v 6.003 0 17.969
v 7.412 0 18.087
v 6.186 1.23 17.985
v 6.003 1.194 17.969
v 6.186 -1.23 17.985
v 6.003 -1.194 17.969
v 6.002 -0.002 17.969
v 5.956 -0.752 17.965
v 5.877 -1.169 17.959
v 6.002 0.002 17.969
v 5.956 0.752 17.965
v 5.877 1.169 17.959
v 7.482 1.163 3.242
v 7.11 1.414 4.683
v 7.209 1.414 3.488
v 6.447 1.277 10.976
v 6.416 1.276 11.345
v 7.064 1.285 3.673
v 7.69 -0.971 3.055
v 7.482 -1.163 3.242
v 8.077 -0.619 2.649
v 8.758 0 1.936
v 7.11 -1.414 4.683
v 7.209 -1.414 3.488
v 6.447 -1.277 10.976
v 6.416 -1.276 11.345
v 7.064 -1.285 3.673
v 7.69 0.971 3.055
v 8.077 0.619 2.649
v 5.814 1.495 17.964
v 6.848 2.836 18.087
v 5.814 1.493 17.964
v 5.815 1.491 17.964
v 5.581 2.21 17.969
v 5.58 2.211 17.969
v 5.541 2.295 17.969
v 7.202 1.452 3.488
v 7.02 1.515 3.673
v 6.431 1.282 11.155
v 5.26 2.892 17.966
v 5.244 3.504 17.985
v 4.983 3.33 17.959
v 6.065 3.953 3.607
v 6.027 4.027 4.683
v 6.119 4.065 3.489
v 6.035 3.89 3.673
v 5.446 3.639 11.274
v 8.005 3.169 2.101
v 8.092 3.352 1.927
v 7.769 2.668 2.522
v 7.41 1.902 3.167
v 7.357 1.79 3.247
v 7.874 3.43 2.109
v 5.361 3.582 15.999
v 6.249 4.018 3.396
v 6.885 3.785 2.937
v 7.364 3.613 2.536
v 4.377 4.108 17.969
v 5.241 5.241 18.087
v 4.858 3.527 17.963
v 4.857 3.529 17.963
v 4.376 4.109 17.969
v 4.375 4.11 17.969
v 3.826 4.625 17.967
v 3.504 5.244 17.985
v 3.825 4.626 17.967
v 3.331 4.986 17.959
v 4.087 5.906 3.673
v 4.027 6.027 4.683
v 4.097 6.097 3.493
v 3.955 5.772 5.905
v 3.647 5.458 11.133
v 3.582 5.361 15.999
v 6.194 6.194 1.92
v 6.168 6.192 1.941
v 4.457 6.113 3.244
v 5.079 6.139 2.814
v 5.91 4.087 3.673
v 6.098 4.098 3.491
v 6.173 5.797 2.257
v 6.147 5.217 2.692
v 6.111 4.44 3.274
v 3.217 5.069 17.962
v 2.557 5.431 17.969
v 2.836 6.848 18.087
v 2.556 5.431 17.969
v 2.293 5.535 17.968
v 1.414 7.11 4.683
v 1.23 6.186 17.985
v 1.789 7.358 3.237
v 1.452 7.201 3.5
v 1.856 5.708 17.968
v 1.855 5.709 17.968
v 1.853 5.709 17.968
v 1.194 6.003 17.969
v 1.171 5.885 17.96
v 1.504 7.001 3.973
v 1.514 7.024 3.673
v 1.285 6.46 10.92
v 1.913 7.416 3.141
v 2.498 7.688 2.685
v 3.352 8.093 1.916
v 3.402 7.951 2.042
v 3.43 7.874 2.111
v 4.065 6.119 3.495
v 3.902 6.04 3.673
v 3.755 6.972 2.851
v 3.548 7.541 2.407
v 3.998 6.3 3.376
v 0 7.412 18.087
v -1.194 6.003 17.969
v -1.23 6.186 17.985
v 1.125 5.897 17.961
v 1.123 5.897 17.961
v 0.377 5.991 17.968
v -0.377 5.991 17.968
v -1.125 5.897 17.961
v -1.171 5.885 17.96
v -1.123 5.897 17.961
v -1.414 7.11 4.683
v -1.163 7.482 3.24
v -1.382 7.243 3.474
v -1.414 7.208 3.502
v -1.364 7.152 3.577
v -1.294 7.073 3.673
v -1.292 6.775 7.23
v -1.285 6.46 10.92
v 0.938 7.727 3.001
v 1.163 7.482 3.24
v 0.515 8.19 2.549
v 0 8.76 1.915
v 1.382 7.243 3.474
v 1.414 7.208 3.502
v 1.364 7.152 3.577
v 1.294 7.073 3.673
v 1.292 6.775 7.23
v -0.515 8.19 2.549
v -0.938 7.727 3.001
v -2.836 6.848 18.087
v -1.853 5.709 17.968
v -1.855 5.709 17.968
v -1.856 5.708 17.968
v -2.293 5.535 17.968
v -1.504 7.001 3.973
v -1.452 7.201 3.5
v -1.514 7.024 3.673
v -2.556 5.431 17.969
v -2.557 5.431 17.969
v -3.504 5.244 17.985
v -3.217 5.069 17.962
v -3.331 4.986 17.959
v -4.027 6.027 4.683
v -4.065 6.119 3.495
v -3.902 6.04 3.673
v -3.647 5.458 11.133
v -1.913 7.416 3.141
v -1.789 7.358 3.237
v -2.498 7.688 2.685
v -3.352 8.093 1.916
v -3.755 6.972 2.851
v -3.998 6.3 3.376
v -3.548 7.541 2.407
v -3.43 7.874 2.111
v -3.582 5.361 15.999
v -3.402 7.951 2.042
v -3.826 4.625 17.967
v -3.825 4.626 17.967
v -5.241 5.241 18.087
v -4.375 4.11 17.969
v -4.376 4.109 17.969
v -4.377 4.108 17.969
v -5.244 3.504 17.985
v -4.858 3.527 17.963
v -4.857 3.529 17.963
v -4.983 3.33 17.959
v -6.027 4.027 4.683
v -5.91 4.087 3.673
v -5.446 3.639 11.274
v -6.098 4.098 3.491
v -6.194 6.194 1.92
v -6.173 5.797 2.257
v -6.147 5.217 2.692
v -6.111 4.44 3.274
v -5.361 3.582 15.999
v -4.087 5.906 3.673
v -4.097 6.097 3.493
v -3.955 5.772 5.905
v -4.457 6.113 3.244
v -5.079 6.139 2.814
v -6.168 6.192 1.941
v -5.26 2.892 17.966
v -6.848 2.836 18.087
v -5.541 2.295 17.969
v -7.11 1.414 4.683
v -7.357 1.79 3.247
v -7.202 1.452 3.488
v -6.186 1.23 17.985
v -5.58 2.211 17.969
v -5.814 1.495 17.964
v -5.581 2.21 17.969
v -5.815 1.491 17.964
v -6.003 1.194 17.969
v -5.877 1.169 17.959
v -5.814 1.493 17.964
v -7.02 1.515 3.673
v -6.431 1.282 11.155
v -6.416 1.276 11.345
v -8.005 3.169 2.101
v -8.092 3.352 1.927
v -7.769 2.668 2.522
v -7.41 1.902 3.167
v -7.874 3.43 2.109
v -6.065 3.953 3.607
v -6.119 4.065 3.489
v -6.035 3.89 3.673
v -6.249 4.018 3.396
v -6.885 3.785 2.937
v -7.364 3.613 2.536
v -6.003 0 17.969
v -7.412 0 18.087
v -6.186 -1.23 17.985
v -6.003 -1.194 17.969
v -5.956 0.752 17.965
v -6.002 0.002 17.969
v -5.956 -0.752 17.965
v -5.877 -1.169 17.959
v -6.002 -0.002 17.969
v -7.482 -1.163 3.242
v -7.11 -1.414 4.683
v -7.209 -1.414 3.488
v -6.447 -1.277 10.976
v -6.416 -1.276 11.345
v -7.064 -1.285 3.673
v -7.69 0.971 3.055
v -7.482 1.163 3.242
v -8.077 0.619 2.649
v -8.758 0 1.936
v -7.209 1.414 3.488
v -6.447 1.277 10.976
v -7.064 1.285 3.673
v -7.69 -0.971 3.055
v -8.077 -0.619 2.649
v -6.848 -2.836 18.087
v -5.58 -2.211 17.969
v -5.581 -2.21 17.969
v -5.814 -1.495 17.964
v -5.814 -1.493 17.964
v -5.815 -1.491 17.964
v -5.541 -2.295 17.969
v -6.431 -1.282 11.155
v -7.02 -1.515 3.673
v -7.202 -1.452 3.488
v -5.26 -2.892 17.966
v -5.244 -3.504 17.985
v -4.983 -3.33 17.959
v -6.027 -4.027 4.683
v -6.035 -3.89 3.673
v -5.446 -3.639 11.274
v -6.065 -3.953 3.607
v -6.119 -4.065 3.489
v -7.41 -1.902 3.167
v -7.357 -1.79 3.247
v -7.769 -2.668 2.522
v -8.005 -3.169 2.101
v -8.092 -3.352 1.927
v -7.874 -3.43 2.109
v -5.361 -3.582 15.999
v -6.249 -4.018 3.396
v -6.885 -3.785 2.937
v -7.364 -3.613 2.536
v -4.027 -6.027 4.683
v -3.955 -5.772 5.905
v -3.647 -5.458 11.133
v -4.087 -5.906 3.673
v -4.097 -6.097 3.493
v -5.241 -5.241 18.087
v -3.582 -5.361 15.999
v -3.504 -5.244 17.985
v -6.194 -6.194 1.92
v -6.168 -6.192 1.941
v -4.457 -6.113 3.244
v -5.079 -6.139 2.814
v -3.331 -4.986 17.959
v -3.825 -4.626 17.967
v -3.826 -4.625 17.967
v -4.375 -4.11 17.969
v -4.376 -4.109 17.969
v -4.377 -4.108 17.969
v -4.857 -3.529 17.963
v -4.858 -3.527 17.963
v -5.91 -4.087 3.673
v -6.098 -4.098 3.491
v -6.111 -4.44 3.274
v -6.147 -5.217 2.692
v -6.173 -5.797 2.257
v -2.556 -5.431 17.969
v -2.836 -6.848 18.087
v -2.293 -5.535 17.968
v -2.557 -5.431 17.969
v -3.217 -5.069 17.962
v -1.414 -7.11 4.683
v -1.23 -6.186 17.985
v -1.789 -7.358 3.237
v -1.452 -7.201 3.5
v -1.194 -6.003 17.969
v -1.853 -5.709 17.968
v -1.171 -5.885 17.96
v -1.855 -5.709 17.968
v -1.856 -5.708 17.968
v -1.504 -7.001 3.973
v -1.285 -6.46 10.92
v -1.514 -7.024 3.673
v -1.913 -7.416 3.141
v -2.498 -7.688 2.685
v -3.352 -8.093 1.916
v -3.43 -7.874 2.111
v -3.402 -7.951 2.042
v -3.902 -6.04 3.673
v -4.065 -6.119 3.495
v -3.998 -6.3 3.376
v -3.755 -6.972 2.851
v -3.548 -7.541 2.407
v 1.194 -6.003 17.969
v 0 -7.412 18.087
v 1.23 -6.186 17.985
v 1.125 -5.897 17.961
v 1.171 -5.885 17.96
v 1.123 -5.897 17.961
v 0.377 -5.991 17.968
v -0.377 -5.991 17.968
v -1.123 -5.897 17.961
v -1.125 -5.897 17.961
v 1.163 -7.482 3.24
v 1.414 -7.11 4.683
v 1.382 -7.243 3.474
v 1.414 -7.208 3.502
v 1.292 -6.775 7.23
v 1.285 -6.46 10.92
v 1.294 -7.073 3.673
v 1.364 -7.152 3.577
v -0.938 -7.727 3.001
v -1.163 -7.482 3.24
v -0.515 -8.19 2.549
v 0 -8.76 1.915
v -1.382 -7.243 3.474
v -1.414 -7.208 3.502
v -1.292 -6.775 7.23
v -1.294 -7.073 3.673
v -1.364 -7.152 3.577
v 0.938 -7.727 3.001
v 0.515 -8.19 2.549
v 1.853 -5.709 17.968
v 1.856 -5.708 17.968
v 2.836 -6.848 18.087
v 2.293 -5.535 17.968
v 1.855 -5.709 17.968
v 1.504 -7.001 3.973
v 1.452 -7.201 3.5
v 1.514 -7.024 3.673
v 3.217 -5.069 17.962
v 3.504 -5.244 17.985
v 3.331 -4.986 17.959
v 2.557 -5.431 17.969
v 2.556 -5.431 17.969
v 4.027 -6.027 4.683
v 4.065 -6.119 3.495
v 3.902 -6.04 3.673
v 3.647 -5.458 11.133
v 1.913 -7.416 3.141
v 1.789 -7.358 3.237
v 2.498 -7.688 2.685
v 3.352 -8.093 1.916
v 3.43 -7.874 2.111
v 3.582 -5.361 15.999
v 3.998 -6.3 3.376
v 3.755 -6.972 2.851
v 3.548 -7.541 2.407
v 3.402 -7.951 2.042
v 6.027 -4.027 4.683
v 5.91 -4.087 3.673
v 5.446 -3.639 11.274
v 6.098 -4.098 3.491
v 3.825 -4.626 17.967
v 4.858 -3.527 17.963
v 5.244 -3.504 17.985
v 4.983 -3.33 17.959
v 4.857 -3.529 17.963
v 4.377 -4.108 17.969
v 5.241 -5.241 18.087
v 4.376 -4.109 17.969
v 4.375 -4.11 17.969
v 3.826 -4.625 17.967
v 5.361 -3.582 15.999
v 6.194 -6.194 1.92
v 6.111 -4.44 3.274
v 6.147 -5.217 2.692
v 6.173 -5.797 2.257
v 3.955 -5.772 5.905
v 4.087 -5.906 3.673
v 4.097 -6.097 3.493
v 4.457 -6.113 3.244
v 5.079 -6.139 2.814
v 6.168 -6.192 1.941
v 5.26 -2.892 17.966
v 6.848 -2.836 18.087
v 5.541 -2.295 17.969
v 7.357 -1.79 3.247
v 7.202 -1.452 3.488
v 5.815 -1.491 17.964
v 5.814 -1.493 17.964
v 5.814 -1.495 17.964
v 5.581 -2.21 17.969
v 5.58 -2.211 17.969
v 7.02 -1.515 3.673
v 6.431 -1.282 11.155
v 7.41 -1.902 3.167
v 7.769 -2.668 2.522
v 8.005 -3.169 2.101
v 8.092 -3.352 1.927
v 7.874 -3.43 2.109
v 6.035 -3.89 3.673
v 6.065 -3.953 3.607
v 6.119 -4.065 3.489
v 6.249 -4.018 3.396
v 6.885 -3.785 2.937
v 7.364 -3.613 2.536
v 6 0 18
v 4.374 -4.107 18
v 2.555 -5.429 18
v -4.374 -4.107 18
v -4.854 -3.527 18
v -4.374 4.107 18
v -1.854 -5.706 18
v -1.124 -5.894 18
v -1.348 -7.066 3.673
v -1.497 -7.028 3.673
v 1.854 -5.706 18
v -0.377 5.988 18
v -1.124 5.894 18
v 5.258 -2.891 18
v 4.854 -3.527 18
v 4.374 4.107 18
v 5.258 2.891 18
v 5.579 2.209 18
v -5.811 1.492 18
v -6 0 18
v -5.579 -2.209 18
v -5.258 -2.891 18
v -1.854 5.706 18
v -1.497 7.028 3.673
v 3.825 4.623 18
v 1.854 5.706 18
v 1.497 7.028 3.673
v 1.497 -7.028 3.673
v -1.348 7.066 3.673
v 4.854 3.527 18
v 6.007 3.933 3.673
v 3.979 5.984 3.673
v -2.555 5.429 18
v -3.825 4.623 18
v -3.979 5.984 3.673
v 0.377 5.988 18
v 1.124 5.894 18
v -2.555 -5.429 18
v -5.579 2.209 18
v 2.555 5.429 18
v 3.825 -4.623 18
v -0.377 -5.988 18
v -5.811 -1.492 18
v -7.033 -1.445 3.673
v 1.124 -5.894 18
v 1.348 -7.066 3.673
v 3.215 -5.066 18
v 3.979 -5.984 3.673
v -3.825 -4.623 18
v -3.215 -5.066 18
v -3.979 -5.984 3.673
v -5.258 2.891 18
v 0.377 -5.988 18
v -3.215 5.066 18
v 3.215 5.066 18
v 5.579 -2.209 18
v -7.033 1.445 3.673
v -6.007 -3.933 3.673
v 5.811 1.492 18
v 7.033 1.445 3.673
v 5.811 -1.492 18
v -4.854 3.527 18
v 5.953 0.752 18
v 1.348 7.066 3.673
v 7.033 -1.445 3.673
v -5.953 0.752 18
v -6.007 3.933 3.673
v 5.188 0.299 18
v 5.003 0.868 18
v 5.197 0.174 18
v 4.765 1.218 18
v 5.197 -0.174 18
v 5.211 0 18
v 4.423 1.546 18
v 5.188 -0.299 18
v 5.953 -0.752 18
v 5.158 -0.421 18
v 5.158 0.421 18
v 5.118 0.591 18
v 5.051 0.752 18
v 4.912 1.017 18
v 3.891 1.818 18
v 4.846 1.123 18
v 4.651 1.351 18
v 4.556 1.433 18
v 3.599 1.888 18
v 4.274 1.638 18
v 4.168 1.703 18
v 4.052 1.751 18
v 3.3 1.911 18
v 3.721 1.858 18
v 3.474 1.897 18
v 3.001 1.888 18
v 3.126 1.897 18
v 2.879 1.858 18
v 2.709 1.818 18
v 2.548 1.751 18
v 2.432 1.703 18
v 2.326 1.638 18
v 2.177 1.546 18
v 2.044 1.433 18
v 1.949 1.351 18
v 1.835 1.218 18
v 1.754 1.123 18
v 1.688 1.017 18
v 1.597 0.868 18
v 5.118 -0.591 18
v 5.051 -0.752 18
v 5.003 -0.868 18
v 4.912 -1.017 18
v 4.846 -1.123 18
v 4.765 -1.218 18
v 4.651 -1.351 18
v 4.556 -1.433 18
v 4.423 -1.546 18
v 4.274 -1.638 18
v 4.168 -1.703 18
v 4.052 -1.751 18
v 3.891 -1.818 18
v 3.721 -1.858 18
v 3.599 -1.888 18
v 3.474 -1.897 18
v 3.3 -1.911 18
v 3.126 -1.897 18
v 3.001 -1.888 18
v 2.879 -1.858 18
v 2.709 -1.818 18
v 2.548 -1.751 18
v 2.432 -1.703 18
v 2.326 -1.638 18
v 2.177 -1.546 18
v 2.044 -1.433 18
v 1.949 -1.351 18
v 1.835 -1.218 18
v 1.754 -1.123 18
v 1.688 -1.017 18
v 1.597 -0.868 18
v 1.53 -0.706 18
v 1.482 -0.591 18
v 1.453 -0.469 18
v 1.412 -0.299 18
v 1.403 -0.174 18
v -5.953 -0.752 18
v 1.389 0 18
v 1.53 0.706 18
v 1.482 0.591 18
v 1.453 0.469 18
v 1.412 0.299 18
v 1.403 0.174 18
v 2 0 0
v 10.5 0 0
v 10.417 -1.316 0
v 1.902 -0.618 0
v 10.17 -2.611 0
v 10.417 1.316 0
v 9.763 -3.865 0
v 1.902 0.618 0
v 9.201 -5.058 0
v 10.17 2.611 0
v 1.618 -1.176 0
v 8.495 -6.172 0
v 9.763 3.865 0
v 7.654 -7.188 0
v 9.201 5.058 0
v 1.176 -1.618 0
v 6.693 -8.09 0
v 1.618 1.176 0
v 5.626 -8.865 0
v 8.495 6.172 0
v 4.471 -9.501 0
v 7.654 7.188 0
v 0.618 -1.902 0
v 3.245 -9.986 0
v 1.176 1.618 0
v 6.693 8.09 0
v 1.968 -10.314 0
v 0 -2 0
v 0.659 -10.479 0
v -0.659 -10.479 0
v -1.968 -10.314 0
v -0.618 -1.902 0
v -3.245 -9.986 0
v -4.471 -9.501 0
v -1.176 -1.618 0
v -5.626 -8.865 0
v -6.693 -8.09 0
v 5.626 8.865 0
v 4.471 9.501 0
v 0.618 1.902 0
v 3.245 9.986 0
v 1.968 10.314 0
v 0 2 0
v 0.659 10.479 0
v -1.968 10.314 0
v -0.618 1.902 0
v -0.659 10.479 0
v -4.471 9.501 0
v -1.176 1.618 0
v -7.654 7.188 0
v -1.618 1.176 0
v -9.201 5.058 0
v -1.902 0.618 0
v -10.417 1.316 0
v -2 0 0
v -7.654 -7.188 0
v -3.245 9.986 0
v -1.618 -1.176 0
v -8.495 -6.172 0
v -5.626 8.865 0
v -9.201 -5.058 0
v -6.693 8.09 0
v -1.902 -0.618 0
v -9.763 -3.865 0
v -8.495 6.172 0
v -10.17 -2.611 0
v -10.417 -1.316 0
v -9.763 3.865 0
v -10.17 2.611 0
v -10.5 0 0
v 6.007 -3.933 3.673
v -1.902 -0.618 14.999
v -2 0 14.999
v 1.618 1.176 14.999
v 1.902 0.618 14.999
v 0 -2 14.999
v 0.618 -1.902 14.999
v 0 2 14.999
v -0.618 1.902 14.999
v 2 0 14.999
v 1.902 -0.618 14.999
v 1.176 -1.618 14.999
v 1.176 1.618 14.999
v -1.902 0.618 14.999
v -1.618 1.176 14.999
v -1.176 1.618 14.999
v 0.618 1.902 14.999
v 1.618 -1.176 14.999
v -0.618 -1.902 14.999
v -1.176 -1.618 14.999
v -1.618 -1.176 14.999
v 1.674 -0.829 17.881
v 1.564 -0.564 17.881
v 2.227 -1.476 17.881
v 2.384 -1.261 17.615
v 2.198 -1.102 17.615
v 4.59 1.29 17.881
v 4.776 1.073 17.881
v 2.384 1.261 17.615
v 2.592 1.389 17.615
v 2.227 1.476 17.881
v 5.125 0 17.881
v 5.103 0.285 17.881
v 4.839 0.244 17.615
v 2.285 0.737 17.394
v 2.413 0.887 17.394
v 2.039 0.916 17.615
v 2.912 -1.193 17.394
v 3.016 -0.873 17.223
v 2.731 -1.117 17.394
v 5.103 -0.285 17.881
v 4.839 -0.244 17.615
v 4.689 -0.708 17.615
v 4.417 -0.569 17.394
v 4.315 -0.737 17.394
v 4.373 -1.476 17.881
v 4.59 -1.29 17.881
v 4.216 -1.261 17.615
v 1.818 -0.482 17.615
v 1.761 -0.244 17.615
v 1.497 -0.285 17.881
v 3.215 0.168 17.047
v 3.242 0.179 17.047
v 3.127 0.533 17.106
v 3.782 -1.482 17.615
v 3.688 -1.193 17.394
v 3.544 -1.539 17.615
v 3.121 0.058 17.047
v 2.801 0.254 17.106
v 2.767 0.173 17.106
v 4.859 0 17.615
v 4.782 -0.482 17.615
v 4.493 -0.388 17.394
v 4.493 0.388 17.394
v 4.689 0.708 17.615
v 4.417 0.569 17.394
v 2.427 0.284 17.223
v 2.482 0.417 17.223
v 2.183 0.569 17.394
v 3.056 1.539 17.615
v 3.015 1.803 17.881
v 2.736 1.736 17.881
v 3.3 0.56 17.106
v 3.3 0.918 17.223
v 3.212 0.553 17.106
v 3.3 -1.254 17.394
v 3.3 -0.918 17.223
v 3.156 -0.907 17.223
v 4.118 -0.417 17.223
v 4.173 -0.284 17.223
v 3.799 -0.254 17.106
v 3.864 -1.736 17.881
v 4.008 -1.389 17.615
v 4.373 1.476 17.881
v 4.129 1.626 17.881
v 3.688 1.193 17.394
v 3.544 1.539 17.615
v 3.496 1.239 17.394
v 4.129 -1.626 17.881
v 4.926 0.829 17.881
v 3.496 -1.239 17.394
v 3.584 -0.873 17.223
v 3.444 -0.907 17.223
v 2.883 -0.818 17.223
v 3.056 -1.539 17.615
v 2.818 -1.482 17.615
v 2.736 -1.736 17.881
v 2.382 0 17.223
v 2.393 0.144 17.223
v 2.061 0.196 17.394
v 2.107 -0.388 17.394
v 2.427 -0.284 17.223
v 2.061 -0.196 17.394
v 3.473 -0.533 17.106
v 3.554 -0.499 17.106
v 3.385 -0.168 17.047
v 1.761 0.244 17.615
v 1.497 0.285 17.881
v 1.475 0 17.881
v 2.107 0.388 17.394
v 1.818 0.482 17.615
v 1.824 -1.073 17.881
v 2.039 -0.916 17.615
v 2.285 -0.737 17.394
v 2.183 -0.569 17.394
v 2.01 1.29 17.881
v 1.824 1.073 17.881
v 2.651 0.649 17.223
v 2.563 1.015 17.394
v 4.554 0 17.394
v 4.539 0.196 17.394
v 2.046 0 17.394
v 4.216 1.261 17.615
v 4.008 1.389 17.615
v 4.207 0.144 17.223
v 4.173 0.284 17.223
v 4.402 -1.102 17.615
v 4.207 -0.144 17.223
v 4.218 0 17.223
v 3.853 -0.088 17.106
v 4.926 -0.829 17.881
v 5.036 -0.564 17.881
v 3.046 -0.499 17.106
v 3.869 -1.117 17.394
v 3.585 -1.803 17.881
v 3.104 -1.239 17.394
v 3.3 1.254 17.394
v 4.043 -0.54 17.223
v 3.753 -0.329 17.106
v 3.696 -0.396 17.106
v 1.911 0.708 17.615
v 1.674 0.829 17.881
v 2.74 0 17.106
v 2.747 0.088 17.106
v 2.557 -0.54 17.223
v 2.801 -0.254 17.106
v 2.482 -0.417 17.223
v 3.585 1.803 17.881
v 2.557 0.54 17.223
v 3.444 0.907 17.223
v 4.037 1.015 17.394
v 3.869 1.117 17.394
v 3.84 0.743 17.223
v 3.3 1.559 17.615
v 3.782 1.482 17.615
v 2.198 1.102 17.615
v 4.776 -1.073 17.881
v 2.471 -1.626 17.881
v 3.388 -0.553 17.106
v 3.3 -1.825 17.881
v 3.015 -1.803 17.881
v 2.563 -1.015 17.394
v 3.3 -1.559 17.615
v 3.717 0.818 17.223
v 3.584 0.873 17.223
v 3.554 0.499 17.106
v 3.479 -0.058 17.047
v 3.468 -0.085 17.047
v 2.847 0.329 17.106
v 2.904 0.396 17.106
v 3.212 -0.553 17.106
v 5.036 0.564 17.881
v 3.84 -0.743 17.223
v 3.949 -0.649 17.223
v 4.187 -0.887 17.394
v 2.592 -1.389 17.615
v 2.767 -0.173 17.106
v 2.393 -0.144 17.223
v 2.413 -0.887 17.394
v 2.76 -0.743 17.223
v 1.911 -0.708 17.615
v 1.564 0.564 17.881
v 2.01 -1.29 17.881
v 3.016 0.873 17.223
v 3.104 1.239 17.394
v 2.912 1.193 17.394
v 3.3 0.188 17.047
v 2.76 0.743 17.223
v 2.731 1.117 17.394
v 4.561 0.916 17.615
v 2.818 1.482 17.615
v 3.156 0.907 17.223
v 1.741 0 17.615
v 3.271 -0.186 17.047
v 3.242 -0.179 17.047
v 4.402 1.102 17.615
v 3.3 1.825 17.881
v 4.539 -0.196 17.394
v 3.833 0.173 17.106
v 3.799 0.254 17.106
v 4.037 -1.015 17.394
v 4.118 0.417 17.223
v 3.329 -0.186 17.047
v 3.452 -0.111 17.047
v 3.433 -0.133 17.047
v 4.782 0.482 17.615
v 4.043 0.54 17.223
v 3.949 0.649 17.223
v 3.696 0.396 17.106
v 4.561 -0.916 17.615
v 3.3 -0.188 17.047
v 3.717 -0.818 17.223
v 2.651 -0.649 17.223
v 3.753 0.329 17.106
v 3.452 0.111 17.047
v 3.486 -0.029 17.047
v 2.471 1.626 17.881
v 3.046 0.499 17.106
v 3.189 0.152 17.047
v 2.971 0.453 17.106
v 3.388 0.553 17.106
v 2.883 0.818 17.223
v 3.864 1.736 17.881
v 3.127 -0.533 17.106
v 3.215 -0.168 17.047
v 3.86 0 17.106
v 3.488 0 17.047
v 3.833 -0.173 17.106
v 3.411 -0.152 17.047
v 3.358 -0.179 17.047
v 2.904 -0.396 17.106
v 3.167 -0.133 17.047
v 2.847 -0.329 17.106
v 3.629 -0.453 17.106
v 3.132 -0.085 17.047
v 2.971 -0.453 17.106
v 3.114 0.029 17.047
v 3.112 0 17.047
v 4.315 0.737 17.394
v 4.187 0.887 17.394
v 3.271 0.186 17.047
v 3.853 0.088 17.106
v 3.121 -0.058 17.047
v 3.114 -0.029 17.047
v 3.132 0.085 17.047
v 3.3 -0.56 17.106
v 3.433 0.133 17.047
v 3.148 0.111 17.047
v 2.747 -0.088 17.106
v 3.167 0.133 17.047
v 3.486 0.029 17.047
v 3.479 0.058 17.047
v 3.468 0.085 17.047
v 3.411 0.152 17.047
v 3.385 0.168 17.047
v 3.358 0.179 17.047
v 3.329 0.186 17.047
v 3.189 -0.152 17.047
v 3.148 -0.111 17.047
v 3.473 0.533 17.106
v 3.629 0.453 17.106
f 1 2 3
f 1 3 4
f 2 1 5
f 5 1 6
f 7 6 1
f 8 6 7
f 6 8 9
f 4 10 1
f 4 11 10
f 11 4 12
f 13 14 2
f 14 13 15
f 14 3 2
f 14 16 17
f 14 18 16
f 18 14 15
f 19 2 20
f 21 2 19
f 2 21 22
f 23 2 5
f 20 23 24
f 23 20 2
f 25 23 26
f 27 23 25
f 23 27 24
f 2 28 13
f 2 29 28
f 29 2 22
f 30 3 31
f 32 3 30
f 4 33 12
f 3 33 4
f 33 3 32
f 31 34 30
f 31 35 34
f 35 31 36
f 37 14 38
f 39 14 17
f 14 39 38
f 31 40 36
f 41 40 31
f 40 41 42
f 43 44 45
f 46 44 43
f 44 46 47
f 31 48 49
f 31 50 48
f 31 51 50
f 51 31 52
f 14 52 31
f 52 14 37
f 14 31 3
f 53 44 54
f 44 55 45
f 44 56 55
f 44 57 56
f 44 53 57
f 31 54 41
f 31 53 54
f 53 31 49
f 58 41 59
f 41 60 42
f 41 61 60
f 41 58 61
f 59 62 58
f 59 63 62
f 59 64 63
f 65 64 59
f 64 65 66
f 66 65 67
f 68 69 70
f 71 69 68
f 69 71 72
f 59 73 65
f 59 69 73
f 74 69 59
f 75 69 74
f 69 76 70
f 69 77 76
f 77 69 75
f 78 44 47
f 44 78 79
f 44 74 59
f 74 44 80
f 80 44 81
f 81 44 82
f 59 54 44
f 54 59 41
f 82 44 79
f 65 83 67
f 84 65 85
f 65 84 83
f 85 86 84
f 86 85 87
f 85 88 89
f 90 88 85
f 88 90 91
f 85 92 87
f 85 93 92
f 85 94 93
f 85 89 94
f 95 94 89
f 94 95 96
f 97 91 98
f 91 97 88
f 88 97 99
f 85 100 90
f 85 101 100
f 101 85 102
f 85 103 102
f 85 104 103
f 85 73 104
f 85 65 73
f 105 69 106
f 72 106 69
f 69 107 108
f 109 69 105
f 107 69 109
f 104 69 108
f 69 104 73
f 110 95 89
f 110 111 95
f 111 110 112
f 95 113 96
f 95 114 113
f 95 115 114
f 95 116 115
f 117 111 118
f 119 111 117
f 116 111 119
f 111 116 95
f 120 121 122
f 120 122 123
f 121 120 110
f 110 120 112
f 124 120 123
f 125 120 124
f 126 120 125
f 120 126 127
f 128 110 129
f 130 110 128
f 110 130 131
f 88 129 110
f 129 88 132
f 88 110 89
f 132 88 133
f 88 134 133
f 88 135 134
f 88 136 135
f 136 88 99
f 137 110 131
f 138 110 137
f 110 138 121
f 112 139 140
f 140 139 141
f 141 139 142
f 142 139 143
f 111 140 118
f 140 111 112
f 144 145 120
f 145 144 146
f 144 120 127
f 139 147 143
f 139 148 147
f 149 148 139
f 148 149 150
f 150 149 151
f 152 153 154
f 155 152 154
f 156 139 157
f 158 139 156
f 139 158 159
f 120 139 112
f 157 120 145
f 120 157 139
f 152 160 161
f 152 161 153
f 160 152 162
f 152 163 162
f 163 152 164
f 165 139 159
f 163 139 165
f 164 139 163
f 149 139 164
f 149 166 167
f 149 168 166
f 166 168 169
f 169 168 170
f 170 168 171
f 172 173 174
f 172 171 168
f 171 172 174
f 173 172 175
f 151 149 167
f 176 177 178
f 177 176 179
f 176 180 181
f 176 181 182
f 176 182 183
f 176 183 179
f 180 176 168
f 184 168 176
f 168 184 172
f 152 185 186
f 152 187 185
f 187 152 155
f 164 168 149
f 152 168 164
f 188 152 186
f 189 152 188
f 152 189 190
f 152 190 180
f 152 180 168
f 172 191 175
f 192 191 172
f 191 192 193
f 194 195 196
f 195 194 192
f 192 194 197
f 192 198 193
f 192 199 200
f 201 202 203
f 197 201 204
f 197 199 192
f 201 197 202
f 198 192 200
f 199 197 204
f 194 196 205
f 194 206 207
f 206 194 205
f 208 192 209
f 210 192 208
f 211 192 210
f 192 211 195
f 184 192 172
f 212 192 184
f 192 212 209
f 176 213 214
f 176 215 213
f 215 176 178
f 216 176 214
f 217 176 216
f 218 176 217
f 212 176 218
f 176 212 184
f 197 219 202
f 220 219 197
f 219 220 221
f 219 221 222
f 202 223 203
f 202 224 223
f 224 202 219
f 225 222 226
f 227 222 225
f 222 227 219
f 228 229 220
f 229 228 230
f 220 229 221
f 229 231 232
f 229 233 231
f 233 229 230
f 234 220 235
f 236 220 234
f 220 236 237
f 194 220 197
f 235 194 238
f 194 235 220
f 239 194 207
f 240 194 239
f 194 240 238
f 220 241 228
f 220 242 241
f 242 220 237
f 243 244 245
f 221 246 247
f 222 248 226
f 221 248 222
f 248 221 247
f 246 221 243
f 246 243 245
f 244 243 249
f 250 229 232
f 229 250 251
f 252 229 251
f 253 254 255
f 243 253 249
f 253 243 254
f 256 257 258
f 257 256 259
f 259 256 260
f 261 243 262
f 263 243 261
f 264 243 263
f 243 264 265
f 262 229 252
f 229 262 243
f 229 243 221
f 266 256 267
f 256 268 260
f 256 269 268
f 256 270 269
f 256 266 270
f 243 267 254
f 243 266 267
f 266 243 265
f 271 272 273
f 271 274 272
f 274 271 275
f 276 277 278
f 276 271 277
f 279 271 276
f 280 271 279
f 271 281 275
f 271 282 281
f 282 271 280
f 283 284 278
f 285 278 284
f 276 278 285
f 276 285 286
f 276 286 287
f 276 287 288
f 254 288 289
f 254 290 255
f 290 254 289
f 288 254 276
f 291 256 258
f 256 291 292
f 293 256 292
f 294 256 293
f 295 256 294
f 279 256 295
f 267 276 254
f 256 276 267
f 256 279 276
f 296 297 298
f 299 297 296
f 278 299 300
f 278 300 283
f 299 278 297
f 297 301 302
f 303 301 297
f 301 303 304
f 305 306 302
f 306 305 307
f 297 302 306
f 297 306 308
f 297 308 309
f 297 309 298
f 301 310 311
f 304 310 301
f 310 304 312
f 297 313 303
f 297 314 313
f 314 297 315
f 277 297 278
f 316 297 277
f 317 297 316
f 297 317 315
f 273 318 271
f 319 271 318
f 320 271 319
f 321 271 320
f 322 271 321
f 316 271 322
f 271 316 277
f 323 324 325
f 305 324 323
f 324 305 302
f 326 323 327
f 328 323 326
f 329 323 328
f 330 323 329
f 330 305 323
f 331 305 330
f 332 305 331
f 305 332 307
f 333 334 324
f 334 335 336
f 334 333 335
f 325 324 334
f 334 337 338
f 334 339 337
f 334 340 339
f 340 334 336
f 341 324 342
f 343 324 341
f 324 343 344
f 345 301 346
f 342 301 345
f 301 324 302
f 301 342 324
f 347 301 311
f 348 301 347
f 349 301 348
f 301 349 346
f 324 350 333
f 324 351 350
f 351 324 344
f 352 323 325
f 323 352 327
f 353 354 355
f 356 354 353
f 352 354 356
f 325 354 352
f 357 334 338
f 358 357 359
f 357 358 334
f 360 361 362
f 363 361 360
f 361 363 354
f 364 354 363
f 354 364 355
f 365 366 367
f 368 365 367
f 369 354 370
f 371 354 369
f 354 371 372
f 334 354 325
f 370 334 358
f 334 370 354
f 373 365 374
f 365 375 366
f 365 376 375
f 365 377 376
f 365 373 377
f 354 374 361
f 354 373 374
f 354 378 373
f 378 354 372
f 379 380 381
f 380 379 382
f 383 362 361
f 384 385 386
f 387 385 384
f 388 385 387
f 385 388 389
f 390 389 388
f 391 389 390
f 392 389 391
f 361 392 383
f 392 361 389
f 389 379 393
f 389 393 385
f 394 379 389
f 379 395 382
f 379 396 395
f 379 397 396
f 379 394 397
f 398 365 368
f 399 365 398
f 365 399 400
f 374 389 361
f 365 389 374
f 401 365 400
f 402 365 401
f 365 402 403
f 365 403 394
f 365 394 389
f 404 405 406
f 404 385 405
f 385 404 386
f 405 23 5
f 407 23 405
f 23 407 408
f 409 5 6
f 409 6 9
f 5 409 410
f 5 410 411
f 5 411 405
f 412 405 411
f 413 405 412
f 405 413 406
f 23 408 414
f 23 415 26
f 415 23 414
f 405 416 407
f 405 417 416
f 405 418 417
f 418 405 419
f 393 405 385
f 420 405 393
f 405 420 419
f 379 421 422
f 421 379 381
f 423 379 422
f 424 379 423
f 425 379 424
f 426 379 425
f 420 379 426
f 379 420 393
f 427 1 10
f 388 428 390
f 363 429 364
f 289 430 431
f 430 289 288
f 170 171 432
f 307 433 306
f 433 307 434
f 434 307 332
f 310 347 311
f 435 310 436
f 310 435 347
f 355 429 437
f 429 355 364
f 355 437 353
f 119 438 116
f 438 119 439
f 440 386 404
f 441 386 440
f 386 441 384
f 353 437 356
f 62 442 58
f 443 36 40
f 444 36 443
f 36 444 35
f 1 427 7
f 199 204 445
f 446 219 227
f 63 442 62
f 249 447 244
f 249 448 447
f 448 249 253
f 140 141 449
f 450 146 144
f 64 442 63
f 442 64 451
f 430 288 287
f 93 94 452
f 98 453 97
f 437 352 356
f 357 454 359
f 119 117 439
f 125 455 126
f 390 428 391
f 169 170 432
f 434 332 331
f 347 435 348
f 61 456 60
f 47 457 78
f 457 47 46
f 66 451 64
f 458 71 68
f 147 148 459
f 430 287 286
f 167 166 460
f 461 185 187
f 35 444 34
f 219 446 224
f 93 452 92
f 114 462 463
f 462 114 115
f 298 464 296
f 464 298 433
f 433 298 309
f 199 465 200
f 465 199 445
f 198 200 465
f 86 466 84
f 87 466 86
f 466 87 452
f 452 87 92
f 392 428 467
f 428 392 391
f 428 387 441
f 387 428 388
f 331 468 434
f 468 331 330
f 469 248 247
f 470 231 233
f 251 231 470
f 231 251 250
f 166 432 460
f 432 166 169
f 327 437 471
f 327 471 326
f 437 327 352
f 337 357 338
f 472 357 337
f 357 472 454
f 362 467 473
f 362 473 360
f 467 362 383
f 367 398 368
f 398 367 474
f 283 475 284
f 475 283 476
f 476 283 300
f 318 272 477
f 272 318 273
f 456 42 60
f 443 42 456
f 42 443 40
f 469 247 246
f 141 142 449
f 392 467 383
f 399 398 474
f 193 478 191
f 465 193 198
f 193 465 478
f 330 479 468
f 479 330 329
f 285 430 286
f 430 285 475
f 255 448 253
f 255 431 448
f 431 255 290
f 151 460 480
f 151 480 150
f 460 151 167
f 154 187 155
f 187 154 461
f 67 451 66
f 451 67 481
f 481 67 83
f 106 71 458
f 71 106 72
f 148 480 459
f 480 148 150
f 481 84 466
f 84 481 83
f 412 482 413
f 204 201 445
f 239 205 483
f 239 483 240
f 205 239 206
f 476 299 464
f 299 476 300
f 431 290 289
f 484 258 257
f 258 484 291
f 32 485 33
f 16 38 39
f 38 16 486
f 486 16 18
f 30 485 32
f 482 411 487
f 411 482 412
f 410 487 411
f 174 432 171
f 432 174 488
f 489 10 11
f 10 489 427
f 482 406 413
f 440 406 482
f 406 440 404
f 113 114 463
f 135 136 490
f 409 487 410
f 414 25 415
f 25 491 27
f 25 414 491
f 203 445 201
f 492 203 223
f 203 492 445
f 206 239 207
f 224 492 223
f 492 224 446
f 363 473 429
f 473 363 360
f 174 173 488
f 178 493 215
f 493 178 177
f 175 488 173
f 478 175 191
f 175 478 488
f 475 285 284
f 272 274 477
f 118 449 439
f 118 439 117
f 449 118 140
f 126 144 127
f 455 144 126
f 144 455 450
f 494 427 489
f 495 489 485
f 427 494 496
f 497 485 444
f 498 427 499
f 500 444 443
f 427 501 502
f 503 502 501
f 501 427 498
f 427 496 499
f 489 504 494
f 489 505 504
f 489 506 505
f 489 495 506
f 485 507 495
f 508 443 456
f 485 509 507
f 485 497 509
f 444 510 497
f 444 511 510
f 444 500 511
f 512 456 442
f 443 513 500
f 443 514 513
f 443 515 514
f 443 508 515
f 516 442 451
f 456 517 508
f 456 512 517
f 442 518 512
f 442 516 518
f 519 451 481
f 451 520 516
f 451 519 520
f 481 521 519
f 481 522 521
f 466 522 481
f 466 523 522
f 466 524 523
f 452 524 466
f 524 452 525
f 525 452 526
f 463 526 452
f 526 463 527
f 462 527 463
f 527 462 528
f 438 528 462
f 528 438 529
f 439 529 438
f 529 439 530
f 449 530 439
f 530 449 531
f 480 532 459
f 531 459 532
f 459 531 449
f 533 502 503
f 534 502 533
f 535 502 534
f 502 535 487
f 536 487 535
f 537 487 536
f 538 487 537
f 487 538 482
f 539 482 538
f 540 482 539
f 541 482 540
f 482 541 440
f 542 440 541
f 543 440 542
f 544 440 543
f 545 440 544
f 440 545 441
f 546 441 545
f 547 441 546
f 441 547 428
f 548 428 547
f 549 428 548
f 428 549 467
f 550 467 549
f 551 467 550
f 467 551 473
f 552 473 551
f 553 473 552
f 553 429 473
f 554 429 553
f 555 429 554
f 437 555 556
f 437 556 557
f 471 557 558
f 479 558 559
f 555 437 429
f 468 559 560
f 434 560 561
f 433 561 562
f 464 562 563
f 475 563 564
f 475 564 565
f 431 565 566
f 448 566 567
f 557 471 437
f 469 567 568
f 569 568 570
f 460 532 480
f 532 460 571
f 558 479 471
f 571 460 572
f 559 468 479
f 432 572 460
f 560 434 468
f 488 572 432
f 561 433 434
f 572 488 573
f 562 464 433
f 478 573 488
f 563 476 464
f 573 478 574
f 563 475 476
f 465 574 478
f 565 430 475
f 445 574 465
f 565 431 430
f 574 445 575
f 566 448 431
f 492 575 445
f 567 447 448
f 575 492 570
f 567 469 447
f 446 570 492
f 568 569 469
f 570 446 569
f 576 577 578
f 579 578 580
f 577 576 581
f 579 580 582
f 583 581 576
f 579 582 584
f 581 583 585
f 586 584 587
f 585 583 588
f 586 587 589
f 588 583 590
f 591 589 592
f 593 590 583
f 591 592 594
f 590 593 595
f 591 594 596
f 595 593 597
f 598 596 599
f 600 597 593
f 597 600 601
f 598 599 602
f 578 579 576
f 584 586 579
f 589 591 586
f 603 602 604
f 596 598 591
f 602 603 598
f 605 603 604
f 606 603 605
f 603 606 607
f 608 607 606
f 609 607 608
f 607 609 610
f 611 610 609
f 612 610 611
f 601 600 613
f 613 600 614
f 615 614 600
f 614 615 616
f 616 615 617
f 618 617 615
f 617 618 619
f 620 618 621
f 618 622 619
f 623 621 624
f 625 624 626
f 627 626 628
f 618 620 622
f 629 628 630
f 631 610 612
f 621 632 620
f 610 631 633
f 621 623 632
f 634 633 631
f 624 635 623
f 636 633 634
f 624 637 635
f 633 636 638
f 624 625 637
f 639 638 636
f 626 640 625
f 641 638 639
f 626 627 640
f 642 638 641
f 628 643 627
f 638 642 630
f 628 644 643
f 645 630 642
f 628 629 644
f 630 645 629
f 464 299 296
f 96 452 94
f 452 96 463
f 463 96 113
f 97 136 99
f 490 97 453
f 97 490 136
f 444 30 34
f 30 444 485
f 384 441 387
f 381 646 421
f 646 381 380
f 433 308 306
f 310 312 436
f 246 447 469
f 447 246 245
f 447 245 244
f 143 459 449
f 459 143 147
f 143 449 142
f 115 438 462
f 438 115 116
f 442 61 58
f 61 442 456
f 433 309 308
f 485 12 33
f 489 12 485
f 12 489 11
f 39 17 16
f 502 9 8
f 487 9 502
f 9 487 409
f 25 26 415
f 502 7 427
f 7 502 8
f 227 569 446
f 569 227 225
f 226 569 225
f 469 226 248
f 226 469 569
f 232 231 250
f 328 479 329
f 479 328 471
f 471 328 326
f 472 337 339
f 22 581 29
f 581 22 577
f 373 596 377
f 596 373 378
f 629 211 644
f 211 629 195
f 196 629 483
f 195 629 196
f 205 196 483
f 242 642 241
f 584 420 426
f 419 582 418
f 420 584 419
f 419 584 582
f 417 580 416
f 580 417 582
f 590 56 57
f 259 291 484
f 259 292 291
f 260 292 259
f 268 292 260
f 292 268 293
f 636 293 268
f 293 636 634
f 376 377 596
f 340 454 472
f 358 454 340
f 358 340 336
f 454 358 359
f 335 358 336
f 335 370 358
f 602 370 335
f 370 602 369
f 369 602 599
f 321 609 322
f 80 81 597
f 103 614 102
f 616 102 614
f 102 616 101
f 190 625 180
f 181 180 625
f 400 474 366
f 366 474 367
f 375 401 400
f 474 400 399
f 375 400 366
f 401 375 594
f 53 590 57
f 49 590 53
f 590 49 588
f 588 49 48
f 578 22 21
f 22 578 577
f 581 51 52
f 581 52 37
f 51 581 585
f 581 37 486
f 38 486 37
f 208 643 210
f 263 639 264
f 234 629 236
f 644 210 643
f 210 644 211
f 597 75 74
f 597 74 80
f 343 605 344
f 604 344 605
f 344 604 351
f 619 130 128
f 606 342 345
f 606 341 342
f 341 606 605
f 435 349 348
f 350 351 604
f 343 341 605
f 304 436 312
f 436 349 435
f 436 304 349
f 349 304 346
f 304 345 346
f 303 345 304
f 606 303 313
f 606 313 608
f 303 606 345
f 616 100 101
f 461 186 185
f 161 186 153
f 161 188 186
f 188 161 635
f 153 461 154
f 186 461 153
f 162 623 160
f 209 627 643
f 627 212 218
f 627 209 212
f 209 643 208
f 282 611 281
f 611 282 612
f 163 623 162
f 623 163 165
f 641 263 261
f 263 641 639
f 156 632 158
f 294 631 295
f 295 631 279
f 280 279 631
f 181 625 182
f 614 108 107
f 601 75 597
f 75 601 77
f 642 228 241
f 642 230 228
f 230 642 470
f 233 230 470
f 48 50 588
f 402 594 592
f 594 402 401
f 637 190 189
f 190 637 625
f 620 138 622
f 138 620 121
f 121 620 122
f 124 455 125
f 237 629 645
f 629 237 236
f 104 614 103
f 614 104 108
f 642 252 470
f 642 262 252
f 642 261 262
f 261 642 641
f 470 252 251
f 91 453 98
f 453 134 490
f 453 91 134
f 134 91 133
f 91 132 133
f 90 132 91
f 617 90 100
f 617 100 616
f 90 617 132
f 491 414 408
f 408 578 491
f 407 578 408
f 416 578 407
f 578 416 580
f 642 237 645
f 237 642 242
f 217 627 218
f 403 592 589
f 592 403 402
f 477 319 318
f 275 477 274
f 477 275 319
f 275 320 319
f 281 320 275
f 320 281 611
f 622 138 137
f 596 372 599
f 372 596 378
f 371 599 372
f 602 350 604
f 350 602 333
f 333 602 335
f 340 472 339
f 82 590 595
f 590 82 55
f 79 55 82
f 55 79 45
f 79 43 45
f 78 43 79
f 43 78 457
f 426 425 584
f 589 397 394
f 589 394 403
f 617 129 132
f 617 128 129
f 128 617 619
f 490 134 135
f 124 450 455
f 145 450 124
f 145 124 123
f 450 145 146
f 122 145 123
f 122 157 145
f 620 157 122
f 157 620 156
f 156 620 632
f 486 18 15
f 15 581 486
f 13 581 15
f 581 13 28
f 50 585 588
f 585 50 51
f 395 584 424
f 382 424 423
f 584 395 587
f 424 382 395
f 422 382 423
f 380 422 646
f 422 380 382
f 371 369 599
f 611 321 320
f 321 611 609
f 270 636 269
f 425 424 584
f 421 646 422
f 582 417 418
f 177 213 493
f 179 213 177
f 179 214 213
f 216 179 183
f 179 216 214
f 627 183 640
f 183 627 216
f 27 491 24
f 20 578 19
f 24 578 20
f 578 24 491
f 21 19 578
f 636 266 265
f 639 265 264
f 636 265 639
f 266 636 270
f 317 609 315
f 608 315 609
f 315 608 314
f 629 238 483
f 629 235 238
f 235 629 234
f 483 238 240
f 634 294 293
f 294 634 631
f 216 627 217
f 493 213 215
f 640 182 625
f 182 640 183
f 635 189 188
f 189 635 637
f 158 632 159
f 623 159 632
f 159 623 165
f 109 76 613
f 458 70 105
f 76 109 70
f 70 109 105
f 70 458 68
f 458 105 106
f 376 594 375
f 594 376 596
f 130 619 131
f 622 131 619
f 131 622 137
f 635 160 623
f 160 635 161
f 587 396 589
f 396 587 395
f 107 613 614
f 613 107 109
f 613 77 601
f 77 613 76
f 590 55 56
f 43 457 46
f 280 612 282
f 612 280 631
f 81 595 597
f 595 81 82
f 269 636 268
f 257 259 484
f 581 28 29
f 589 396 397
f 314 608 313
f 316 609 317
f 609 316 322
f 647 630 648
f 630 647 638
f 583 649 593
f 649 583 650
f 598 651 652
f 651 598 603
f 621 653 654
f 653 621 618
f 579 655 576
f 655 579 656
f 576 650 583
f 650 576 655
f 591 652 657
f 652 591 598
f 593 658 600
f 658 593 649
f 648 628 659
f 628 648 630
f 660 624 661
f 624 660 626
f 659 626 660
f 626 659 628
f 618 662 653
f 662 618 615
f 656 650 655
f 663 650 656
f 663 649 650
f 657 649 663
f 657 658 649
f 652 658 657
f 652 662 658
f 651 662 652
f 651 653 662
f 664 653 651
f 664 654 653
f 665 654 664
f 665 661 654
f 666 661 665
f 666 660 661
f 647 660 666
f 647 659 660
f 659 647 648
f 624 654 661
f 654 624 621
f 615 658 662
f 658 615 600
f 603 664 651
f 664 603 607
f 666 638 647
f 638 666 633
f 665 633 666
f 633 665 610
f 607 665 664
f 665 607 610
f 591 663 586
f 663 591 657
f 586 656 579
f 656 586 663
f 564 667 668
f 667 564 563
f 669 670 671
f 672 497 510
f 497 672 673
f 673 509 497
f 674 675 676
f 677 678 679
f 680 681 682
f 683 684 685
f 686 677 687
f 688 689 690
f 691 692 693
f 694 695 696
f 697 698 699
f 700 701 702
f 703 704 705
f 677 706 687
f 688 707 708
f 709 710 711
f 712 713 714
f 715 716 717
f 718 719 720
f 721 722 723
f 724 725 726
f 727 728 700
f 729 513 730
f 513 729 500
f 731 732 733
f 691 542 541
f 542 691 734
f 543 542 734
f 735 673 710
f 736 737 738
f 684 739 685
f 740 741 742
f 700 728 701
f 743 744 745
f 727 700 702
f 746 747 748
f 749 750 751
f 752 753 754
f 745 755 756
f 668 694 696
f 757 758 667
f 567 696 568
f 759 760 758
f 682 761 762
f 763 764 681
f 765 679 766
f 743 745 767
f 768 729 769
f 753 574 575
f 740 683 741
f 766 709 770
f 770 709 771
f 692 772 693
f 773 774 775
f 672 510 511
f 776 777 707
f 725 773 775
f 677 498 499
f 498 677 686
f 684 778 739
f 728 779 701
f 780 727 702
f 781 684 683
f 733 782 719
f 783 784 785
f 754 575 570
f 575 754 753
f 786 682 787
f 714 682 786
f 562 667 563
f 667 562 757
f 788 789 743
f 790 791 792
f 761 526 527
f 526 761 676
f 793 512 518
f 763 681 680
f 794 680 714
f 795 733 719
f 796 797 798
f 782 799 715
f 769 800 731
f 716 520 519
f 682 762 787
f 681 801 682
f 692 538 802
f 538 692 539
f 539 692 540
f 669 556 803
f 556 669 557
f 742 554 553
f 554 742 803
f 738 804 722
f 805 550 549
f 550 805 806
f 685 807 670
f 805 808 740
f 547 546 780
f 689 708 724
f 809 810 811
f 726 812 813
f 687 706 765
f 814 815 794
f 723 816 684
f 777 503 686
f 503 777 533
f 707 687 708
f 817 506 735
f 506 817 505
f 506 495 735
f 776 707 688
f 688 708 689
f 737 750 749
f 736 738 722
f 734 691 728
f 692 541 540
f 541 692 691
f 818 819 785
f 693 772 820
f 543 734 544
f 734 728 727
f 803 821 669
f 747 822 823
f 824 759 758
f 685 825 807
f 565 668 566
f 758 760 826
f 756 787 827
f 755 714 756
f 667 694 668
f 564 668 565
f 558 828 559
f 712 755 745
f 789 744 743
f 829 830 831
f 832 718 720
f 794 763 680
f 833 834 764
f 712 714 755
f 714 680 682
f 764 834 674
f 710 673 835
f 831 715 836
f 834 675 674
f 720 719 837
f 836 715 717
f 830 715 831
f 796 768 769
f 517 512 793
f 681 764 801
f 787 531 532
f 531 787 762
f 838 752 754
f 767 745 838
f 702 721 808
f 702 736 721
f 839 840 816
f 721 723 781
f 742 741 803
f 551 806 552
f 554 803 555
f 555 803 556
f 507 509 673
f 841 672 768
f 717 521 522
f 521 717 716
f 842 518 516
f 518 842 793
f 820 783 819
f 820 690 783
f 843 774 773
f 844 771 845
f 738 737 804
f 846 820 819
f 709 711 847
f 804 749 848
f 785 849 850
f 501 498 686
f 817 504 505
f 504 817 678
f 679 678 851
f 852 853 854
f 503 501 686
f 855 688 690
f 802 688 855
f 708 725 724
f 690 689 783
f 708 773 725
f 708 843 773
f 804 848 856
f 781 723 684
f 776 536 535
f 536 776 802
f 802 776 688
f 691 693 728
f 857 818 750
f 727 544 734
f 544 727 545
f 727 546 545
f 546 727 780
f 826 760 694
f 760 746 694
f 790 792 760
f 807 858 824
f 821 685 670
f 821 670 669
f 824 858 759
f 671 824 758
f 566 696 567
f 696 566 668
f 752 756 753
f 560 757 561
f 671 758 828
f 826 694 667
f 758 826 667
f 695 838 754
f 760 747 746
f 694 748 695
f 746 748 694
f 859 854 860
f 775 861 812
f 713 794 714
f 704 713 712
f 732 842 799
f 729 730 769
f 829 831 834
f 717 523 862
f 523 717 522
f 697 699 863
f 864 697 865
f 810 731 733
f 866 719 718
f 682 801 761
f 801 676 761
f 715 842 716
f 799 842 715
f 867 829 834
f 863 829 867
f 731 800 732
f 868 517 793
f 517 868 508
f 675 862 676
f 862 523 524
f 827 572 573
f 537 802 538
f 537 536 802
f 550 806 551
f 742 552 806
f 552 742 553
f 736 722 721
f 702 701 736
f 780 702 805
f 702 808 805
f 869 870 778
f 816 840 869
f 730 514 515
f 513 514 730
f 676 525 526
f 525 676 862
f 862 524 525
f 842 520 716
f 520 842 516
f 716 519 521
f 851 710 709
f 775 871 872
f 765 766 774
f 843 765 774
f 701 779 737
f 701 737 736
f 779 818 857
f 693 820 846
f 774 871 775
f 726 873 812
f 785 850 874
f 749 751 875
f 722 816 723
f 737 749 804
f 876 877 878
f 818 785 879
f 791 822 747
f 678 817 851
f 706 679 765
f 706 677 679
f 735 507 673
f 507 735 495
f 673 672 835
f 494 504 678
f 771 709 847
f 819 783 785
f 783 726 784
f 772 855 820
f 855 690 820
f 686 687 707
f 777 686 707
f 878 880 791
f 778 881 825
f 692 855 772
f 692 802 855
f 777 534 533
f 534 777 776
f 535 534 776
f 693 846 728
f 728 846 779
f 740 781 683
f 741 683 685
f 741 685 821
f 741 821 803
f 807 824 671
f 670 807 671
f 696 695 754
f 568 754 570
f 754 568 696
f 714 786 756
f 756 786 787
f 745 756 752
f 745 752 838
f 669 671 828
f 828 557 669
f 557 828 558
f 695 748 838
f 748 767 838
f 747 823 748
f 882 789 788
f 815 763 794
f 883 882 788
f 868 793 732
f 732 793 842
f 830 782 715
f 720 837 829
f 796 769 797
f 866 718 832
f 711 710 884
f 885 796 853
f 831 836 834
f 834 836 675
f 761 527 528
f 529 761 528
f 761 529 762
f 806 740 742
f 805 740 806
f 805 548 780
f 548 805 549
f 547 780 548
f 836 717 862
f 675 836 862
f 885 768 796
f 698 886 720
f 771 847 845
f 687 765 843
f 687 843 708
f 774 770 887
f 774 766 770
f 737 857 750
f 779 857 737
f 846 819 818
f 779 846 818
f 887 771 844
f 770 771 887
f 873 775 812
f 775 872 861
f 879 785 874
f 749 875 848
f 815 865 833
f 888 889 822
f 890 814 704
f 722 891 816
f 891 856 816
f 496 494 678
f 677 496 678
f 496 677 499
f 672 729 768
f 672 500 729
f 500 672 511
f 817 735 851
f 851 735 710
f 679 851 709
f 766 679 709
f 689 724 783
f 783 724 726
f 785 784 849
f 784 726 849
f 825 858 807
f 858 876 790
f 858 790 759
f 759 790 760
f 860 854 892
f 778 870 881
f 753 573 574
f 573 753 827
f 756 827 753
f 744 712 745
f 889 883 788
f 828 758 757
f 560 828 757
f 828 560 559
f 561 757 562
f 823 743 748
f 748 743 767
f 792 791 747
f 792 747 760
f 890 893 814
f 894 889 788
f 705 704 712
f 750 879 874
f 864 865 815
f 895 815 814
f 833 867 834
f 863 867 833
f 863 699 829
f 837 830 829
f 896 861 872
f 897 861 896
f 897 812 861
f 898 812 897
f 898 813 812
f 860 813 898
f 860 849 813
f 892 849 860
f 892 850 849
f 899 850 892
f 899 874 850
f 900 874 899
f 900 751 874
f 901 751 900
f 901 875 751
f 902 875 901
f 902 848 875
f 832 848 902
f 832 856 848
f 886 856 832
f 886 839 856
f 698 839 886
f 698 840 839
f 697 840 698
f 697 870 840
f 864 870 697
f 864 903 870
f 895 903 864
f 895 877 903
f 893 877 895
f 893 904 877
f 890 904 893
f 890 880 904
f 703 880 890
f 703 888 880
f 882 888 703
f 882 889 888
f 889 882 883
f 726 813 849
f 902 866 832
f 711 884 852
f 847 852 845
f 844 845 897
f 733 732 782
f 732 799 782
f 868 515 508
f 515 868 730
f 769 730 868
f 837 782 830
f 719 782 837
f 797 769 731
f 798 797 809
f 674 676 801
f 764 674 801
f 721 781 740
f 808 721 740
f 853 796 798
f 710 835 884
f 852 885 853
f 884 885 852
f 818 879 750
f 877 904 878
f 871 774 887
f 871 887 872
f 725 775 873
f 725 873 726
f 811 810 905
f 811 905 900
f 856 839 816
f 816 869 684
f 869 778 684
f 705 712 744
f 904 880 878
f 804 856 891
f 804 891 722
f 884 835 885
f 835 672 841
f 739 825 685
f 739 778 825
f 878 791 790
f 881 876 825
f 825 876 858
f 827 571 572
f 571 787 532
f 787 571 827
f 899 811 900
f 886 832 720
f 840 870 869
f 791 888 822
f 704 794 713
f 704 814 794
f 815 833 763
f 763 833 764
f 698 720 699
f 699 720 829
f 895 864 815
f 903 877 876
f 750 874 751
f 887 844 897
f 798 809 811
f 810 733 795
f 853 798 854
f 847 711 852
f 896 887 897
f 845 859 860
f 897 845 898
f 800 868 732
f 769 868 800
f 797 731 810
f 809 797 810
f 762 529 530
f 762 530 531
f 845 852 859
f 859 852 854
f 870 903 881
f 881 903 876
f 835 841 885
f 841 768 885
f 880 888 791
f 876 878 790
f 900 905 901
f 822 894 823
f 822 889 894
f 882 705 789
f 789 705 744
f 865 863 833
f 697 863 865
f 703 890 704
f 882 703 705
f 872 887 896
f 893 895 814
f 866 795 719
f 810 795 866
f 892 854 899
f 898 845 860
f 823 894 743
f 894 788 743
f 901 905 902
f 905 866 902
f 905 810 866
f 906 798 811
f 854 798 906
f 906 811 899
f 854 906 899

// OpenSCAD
// Loch-Durchmesser in mm.
HoleDiameter = 4;

// Tiefe des Lochs im Boden (in mm). 
HoleDepth = 15;

// Wenn du ein D-förmiges Loch wünscht, stelle die Dicke auf der flachen Seite (in mm) ein.  Größere Werte für die Ebene machen das Loch kleiner.
HoleFlatThickness = 0;

// Höhe (in mm).  Wenn die Kuppelkappe ausgewählt ist, ist sie nicht in der Höhe enthalten.  Auch die Wellenlänge wird nicht gezählt.
KnobHeight = 18 ;

// Durchmesser des Knopfes in mm.  
KnobDiameter = 15;

// Form der Oberseite des Knopfes.  Der Typ "Einbau" kann lackiert werden.
CapType = 0;	// [0:Flach, 1:Einbau, 2:Dome]

// Möchtest du einen großen StilZeiger?
TimerKnob=0;	// [0:Nein, 1:Ja]

// Möchtest du eine Markierung oben, um die Richtung anzuzeigen?
Pointer1 = 1;	// [0:Nein, 1:Ja]

// Möchtest du einen Richtungszeiger?
Pointer2 = 0;	// [0:Nein, 1:Ja]

// Willst du einen Rändelung um den Knopf?
Knurled = 1;	// [0:Nein, 1:Ja]

// 0 = Ein zylindrischer Knopf, jeder andere Wert verjüngen den Knopf.
TaperPercentage = 20;		// [0:0%, 10:10%, 20:20%, 30:30%, 40:40%, 50:50%]

// Breite des Rings "Dial" (in mm).  0= keine RIng
RingWidth = 3;

// Die Anzahl der Markierungen auf dem Zifferblatt.  0 = keine Markierungen   (RingWidth muss ungleich Null sein.)
RingMarkings = 0;

// Durchmesser des Lochs für die Befestigungsschraube in mm.  0 = kein Loch
ScrewHoleDiameter = 0;

//  Länge der Welle auf der Unterseite des Knopfes (in mm).  0 = keine Welle
ShaftLength = 0;

// Durchmesser der Welle auf der Unterseite des Knopfes in mm.  (ShaftLength größer Null sein.)
ShaftDiameter = 10;

// Möchtest du eine Kerbe in der Welle?  Es kann für einen Einpressknopf verwendet werden (anstelle einer Befestigungsschraube).  (ShaftLength größer Null sein.)
NotchedShaft = 0;	// [0:No, 1:Yes]

$fn=60;

//////////////////////////
//Erweiterte Einstellungen
//////////////////////////

RingThickness = 5*1;
DivotDepth = 1.5*1;
MarkingWidth = 1.5*1;
DistanceBetweenKnurls = 3*1;
TimerKnobConst = 1.8*1;



//////////////////////////
//Berechnungen
//////////////////////////

PI=3.14159265*1;
KnobMajorRadius = KnobDiameter/2;
KnobMinorRadius = KnobDiameter/2 * (1 - TaperPercentage/100);
KnobRadius = KnobMinorRadius + (KnobMajorRadius-KnobMinorRadius)/2;
KnobCircumference = PI*KnobDiameter;
Knurls = round(KnobCircumference/DistanceBetweenKnurls);
Divot=CapType;

TaperAngle=asin(KnobHeight / (sqrt(pow(KnobHeight, 2) +
		pow(KnobMajorRadius-KnobMinorRadius,2)))) - 90;

DivotRadius = KnobMinorRadius*.4;


union()
{
translate([0, 0, (ShaftLength==0)? 0 : ShaftLength-0.001])
difference()
{
union()
{
	// Primary knob cylinder
	cylinder(h=KnobHeight, r1=KnobMajorRadius, r2=KnobMinorRadius,
			$fn=50);
	
	if (Knurled)
		for (i=[0 : Knurls-1])
			rotate([0, 0, i * (360/Knurls)])
				translate([KnobRadius, 0, KnobHeight/2])
					rotate([0, TaperAngle, 0]) rotate([0, 0, 45])
						cube([2, 2, KnobHeight+.001], center=true);

 	if (RingMarkings>0)
		for (i=[0 : RingMarkings-1])
			rotate([0, 0, i * (360/RingMarkings)])
				translate([KnobMajorRadius + RingWidth/2, 0, 1])
					cube([RingWidth*.5, MarkingWidth, 2], center=true);		
	
	if (Pointer2==1)
		translate([KnobRadius, 0, KnobHeight/2-2])
			rotate([0, TaperAngle, 0])
				cube([8, 3, KnobHeight], center=true);		

	if (RingWidth>0)
		translate([0, 0, RingThickness/2])
			cylinder(r1=KnobMajorRadius + RingWidth, r2=KnobMinorRadius,
					h=RingThickness, $fn=50, center=true);

	if (Divot==2)
		translate([0, 0, KnobHeight])
			difference()
			{
				scale([1, 1, 0.5])
					sphere(r=KnobMinorRadius, $fn=50, center=true);

				translate([0, 0, 0-(KnobMinorRadius+.001)])
					cube([KnobMinorRadius*2.5, KnobMinorRadius*2.5,
							KnobMinorRadius*2], center=true);
			}

	if (TimerKnob==1) intersection()
		{
			translate([0, 0, 0-(KnobDiameter*TimerKnobConst) + KnobHeight])
			sphere(r=KnobDiameter*TimerKnobConst, $fn=80, center=true);		
	
			translate([0-(KnobDiameter*TimerKnobConst)*0.1, 0,
					KnobHeight/2])
				scale([1, 0.5, 1])
					cylinder(h=KnobHeight, r=(KnobDiameter*TimerKnobConst) *
							0.8, $fn=3, center=true);
		}
}

// Zeiger1
if (Pointer1==1)
	translate([KnobMinorRadius*.55, 0, KnobHeight + DivotRadius*.6])
		sphere(r=DivotRadius, $fn=40);

// Divot1: Zentrierter zylynischer Divot
if (Divot==1)
	translate([0, 0, KnobHeight])
		cylinder(h=DivotDepth*2, r=KnobMinorRadius-1.5, $fn=50,
				center=true);

if (ShaftLength==0)
{
	// Loch für Welle
	translate([0, 0, HoleDepth/2 - 0.001])
		difference()
		{
			cylinder(r=HoleDiameter/2, h=HoleDepth, $fn=20,
					center=true);
	
			// D-förmiges Loch
			translate([(0-HoleDiameter)+HoleFlatThickness, 0, 0])
				cube([HoleDiameter, HoleDiameter, HoleDepth+.001],
						center=true);
		}
	
	// Loch für Befestigungsschraube
	if (ScrewHoleDiameter>0)
		translate([0 - (KnobMajorRadius+RingWidth+1)/2, 0,
				HoleDepth/2])
			rotate([0, 90, 0])
			cylinder(h=(KnobMajorRadius+RingWidth+1),
					r=ScrewHoleDiameter/2, $fn=20, center=true);
}

// Stelle sicher, dass die unteren Enden bei z=0
translate([0, 0, -10])
	cube([(KnobMajorRadius+RingWidth) * 3,
			(KnobMajorRadius+RingWidth) * 3, 20], center=true);
}

if (ShaftLength>0)
	difference()
	{
		translate([0, 0, ShaftLength/2])
			cylinder(h=ShaftLength, r=ShaftDiameter/2, $fn=20,
					center=true);

		if (NotchedShaft==1)
		{
			cube([HoleDiameter/2, ShaftDiameter*2, ShaftLength],
					center=true);
		}

		// Loch für Welle
		translate([0, 0, HoleDepth/2 - 0.001])
			difference()
			{
				cylinder(r=HoleDiameter/2, h=HoleDepth, $fn=20,
						center=true);
		
				// D-förmiges Loch
				translate([(0-HoleDiameter)+HoleFlatThickness, 0, 0])
					cube([HoleDiameter, HoleDiameter, HoleDepth+.001],
							center=true);
			}
		
		// Loch für Befestigungsschraube
		if (ScrewHoleDiameter>0)
			translate([0 - (KnobMajorRadius+RingWidth+1)/2, 0,
					HoleDepth/2])
				rotate([0, 90, 0])
				cylinder(h=(KnobMajorRadius+RingWidth+1),
						r=ScrewHoleDiameter/2, $fn=20, center=true);
	}
}
